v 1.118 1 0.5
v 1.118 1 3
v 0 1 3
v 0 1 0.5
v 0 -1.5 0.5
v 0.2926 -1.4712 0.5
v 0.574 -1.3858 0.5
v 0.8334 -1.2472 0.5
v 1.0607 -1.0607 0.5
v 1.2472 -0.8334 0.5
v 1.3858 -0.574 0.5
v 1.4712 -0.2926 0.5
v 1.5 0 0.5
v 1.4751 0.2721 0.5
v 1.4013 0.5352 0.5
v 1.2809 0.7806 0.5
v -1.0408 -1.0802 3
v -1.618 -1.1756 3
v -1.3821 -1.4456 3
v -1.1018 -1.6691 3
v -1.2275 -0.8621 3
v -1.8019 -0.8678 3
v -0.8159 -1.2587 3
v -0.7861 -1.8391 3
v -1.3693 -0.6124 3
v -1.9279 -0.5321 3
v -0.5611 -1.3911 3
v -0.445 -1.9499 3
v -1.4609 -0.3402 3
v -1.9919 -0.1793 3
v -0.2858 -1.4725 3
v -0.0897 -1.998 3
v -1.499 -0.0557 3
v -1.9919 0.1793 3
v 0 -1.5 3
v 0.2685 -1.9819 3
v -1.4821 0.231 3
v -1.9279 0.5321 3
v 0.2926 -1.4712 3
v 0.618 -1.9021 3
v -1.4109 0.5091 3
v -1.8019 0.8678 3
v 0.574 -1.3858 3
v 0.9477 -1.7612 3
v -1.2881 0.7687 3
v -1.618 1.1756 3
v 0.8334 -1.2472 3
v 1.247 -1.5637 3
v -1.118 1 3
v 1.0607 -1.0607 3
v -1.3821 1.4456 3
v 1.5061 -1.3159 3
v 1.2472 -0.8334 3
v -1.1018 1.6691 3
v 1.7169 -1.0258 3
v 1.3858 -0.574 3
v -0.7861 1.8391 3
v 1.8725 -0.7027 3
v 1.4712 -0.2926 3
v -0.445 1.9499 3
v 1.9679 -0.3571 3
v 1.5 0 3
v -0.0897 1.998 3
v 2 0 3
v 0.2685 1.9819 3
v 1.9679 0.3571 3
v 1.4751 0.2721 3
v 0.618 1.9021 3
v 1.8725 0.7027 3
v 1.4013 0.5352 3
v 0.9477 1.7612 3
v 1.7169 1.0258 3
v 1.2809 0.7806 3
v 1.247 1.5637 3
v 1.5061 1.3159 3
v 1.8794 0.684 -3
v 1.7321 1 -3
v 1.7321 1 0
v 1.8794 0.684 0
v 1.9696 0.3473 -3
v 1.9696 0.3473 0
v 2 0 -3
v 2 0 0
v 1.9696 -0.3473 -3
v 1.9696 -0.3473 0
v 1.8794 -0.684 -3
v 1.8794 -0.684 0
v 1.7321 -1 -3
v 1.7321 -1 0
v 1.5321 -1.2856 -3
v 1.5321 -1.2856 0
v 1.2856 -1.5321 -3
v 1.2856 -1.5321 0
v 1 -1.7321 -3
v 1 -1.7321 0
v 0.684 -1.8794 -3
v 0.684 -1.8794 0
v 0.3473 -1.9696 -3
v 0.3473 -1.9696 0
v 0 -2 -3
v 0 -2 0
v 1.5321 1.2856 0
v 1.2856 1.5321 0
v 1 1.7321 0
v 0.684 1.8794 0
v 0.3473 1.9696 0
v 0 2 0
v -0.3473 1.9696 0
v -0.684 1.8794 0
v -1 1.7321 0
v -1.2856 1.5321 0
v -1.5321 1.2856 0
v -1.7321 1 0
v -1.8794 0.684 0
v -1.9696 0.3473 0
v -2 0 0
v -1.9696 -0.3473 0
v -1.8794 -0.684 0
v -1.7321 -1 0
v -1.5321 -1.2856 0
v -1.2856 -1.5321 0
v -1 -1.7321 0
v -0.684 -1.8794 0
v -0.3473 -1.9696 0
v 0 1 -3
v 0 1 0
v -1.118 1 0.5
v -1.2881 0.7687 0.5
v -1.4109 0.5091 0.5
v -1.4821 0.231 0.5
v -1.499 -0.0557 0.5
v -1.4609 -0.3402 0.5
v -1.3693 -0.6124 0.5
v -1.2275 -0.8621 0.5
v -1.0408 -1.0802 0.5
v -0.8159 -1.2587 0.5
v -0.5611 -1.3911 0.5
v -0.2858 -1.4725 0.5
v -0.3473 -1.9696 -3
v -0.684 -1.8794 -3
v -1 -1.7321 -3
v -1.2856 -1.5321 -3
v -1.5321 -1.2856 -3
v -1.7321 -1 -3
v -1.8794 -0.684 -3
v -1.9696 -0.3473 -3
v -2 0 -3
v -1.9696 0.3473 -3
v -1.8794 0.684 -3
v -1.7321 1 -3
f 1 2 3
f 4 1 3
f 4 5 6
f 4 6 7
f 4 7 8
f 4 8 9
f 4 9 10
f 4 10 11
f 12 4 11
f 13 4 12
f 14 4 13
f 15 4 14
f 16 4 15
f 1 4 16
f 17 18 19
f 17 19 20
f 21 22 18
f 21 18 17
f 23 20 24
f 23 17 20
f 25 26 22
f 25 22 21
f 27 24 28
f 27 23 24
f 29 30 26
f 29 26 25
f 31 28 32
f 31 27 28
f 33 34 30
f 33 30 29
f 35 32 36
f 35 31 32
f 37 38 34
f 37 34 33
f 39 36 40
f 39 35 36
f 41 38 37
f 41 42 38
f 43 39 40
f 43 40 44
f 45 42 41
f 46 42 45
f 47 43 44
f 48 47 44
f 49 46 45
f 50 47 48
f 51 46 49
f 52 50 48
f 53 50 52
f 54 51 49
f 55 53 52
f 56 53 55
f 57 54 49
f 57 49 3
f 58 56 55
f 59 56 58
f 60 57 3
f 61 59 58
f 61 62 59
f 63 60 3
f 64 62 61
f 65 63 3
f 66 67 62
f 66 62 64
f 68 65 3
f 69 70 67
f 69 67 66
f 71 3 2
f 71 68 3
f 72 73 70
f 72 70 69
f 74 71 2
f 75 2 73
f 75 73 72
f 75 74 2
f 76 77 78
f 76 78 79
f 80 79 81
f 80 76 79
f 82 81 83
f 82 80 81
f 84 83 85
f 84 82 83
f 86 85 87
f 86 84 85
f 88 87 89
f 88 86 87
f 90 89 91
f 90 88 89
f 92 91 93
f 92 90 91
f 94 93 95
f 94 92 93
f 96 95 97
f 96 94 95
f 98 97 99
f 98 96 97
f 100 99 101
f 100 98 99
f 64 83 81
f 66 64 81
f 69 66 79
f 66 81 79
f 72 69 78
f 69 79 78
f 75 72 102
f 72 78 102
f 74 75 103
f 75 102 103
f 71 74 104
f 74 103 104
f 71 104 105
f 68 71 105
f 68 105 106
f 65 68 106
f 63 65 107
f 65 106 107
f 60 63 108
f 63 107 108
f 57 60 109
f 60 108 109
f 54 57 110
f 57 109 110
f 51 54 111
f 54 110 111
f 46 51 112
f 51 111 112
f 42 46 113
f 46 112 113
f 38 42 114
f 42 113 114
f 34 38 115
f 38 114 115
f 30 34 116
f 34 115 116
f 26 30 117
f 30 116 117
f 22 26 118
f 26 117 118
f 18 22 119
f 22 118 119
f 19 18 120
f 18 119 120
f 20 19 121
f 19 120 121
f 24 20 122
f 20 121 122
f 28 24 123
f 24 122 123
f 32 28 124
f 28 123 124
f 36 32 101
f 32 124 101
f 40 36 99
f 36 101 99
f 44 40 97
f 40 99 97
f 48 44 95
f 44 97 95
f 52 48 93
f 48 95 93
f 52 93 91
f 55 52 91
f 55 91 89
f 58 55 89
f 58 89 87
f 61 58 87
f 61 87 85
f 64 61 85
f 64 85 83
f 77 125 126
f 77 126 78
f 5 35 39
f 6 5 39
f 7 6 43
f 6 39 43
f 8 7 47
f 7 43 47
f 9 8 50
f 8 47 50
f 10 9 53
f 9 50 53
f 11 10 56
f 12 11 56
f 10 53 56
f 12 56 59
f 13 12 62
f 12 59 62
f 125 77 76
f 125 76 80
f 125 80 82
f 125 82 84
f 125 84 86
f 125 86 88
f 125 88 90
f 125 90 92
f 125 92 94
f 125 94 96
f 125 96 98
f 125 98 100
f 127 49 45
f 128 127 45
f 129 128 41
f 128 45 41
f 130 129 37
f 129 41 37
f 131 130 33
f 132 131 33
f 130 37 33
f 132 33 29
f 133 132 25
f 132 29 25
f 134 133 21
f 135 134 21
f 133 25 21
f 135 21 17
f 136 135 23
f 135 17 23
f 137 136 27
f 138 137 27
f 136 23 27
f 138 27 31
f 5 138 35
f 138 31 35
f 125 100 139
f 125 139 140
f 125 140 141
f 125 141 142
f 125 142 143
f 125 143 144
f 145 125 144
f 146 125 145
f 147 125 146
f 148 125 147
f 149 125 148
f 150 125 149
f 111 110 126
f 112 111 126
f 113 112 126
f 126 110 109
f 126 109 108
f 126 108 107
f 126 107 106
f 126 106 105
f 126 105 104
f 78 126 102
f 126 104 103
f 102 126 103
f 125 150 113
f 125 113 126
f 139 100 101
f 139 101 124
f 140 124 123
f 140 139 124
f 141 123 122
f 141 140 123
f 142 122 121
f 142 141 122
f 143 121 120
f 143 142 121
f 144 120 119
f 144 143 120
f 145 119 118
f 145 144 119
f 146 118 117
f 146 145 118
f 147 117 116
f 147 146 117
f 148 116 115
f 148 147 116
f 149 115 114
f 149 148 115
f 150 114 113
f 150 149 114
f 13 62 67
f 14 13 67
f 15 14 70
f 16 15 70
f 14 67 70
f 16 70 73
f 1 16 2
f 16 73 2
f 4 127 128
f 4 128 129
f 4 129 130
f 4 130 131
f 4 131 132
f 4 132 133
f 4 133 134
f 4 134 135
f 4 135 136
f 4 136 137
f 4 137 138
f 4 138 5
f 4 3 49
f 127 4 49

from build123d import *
from build123d.topology import SkipClean

# Parameters (mm, degrees)
SKETCH1_R      = 2
EXTRUDE1_DEPTH = 3
EXTRUDE2_START = 3
EXTRUDE2_DEPTH = 3
EXTRUDE3_DEPTH = 2.5


with BuildPart() as part:
    # Sketch1 → Extrude1 (new body)
    with BuildSketch(Plane.XY):
        Circle(SKETCH1_R)
    extrude(amount=EXTRUDE1_DEPTH)

    # Sketch2 → Extrude2 (add)
    with SkipClean():  # the faces are left unmerged after this step: merging them gives an invalid solid
        with BuildSketch(Plane(origin=(0, 0, 0), x_dir=(-1, 0, 0), z_dir=(0, 0, -1)).offset(EXTRUDE2_START)):
            with BuildLine():
                ThreePointArc((-1.732050808, 1), (-1.732050808, -1), (0, -2))
                Line((0, -2), (0, 1))
                Line((0, 1), (-1.732050808, 1))
            make_face()
            with BuildLine():
                Line((0, 1), (0, -2))
                ThreePointArc((0, -2), (1.732050808, -1), (1.732050808, 1))
                Line((1.732050808, 1), (0, 1))
            make_face()
        extrude(amount=-EXTRUDE2_DEPTH)

    # Sketch3 → Extrude3 (cut)
    with SkipClean():  # the faces are left unmerged after this step: merging them gives an invalid solid
        with BuildSketch(Plane.XY.offset(3)):
            with BuildLine():
                ThreePointArc((-1.118033989, 1), (-1.369306394, -0.612372436), (0, -1.5))
                Line((0, -1.5), (0, 1))
                Line((0, 1), (-1.118033989, 1))
            make_face()
            with BuildLine():
                Line((0, 1), (0, -1.5))
                ThreePointArc((0, -1.5), (1.060660172, -1.060660172), (1.5, 0))
                ThreePointArc((1.5, 0), (1.401258538, 0.535233135), (1.118033989, 1))
                Line((1.118033989, 1), (0, 1))
            make_face()
        extrude(amount=-EXTRUDE3_DEPTH, mode=Mode.SUBTRACT)


solid = part.part
